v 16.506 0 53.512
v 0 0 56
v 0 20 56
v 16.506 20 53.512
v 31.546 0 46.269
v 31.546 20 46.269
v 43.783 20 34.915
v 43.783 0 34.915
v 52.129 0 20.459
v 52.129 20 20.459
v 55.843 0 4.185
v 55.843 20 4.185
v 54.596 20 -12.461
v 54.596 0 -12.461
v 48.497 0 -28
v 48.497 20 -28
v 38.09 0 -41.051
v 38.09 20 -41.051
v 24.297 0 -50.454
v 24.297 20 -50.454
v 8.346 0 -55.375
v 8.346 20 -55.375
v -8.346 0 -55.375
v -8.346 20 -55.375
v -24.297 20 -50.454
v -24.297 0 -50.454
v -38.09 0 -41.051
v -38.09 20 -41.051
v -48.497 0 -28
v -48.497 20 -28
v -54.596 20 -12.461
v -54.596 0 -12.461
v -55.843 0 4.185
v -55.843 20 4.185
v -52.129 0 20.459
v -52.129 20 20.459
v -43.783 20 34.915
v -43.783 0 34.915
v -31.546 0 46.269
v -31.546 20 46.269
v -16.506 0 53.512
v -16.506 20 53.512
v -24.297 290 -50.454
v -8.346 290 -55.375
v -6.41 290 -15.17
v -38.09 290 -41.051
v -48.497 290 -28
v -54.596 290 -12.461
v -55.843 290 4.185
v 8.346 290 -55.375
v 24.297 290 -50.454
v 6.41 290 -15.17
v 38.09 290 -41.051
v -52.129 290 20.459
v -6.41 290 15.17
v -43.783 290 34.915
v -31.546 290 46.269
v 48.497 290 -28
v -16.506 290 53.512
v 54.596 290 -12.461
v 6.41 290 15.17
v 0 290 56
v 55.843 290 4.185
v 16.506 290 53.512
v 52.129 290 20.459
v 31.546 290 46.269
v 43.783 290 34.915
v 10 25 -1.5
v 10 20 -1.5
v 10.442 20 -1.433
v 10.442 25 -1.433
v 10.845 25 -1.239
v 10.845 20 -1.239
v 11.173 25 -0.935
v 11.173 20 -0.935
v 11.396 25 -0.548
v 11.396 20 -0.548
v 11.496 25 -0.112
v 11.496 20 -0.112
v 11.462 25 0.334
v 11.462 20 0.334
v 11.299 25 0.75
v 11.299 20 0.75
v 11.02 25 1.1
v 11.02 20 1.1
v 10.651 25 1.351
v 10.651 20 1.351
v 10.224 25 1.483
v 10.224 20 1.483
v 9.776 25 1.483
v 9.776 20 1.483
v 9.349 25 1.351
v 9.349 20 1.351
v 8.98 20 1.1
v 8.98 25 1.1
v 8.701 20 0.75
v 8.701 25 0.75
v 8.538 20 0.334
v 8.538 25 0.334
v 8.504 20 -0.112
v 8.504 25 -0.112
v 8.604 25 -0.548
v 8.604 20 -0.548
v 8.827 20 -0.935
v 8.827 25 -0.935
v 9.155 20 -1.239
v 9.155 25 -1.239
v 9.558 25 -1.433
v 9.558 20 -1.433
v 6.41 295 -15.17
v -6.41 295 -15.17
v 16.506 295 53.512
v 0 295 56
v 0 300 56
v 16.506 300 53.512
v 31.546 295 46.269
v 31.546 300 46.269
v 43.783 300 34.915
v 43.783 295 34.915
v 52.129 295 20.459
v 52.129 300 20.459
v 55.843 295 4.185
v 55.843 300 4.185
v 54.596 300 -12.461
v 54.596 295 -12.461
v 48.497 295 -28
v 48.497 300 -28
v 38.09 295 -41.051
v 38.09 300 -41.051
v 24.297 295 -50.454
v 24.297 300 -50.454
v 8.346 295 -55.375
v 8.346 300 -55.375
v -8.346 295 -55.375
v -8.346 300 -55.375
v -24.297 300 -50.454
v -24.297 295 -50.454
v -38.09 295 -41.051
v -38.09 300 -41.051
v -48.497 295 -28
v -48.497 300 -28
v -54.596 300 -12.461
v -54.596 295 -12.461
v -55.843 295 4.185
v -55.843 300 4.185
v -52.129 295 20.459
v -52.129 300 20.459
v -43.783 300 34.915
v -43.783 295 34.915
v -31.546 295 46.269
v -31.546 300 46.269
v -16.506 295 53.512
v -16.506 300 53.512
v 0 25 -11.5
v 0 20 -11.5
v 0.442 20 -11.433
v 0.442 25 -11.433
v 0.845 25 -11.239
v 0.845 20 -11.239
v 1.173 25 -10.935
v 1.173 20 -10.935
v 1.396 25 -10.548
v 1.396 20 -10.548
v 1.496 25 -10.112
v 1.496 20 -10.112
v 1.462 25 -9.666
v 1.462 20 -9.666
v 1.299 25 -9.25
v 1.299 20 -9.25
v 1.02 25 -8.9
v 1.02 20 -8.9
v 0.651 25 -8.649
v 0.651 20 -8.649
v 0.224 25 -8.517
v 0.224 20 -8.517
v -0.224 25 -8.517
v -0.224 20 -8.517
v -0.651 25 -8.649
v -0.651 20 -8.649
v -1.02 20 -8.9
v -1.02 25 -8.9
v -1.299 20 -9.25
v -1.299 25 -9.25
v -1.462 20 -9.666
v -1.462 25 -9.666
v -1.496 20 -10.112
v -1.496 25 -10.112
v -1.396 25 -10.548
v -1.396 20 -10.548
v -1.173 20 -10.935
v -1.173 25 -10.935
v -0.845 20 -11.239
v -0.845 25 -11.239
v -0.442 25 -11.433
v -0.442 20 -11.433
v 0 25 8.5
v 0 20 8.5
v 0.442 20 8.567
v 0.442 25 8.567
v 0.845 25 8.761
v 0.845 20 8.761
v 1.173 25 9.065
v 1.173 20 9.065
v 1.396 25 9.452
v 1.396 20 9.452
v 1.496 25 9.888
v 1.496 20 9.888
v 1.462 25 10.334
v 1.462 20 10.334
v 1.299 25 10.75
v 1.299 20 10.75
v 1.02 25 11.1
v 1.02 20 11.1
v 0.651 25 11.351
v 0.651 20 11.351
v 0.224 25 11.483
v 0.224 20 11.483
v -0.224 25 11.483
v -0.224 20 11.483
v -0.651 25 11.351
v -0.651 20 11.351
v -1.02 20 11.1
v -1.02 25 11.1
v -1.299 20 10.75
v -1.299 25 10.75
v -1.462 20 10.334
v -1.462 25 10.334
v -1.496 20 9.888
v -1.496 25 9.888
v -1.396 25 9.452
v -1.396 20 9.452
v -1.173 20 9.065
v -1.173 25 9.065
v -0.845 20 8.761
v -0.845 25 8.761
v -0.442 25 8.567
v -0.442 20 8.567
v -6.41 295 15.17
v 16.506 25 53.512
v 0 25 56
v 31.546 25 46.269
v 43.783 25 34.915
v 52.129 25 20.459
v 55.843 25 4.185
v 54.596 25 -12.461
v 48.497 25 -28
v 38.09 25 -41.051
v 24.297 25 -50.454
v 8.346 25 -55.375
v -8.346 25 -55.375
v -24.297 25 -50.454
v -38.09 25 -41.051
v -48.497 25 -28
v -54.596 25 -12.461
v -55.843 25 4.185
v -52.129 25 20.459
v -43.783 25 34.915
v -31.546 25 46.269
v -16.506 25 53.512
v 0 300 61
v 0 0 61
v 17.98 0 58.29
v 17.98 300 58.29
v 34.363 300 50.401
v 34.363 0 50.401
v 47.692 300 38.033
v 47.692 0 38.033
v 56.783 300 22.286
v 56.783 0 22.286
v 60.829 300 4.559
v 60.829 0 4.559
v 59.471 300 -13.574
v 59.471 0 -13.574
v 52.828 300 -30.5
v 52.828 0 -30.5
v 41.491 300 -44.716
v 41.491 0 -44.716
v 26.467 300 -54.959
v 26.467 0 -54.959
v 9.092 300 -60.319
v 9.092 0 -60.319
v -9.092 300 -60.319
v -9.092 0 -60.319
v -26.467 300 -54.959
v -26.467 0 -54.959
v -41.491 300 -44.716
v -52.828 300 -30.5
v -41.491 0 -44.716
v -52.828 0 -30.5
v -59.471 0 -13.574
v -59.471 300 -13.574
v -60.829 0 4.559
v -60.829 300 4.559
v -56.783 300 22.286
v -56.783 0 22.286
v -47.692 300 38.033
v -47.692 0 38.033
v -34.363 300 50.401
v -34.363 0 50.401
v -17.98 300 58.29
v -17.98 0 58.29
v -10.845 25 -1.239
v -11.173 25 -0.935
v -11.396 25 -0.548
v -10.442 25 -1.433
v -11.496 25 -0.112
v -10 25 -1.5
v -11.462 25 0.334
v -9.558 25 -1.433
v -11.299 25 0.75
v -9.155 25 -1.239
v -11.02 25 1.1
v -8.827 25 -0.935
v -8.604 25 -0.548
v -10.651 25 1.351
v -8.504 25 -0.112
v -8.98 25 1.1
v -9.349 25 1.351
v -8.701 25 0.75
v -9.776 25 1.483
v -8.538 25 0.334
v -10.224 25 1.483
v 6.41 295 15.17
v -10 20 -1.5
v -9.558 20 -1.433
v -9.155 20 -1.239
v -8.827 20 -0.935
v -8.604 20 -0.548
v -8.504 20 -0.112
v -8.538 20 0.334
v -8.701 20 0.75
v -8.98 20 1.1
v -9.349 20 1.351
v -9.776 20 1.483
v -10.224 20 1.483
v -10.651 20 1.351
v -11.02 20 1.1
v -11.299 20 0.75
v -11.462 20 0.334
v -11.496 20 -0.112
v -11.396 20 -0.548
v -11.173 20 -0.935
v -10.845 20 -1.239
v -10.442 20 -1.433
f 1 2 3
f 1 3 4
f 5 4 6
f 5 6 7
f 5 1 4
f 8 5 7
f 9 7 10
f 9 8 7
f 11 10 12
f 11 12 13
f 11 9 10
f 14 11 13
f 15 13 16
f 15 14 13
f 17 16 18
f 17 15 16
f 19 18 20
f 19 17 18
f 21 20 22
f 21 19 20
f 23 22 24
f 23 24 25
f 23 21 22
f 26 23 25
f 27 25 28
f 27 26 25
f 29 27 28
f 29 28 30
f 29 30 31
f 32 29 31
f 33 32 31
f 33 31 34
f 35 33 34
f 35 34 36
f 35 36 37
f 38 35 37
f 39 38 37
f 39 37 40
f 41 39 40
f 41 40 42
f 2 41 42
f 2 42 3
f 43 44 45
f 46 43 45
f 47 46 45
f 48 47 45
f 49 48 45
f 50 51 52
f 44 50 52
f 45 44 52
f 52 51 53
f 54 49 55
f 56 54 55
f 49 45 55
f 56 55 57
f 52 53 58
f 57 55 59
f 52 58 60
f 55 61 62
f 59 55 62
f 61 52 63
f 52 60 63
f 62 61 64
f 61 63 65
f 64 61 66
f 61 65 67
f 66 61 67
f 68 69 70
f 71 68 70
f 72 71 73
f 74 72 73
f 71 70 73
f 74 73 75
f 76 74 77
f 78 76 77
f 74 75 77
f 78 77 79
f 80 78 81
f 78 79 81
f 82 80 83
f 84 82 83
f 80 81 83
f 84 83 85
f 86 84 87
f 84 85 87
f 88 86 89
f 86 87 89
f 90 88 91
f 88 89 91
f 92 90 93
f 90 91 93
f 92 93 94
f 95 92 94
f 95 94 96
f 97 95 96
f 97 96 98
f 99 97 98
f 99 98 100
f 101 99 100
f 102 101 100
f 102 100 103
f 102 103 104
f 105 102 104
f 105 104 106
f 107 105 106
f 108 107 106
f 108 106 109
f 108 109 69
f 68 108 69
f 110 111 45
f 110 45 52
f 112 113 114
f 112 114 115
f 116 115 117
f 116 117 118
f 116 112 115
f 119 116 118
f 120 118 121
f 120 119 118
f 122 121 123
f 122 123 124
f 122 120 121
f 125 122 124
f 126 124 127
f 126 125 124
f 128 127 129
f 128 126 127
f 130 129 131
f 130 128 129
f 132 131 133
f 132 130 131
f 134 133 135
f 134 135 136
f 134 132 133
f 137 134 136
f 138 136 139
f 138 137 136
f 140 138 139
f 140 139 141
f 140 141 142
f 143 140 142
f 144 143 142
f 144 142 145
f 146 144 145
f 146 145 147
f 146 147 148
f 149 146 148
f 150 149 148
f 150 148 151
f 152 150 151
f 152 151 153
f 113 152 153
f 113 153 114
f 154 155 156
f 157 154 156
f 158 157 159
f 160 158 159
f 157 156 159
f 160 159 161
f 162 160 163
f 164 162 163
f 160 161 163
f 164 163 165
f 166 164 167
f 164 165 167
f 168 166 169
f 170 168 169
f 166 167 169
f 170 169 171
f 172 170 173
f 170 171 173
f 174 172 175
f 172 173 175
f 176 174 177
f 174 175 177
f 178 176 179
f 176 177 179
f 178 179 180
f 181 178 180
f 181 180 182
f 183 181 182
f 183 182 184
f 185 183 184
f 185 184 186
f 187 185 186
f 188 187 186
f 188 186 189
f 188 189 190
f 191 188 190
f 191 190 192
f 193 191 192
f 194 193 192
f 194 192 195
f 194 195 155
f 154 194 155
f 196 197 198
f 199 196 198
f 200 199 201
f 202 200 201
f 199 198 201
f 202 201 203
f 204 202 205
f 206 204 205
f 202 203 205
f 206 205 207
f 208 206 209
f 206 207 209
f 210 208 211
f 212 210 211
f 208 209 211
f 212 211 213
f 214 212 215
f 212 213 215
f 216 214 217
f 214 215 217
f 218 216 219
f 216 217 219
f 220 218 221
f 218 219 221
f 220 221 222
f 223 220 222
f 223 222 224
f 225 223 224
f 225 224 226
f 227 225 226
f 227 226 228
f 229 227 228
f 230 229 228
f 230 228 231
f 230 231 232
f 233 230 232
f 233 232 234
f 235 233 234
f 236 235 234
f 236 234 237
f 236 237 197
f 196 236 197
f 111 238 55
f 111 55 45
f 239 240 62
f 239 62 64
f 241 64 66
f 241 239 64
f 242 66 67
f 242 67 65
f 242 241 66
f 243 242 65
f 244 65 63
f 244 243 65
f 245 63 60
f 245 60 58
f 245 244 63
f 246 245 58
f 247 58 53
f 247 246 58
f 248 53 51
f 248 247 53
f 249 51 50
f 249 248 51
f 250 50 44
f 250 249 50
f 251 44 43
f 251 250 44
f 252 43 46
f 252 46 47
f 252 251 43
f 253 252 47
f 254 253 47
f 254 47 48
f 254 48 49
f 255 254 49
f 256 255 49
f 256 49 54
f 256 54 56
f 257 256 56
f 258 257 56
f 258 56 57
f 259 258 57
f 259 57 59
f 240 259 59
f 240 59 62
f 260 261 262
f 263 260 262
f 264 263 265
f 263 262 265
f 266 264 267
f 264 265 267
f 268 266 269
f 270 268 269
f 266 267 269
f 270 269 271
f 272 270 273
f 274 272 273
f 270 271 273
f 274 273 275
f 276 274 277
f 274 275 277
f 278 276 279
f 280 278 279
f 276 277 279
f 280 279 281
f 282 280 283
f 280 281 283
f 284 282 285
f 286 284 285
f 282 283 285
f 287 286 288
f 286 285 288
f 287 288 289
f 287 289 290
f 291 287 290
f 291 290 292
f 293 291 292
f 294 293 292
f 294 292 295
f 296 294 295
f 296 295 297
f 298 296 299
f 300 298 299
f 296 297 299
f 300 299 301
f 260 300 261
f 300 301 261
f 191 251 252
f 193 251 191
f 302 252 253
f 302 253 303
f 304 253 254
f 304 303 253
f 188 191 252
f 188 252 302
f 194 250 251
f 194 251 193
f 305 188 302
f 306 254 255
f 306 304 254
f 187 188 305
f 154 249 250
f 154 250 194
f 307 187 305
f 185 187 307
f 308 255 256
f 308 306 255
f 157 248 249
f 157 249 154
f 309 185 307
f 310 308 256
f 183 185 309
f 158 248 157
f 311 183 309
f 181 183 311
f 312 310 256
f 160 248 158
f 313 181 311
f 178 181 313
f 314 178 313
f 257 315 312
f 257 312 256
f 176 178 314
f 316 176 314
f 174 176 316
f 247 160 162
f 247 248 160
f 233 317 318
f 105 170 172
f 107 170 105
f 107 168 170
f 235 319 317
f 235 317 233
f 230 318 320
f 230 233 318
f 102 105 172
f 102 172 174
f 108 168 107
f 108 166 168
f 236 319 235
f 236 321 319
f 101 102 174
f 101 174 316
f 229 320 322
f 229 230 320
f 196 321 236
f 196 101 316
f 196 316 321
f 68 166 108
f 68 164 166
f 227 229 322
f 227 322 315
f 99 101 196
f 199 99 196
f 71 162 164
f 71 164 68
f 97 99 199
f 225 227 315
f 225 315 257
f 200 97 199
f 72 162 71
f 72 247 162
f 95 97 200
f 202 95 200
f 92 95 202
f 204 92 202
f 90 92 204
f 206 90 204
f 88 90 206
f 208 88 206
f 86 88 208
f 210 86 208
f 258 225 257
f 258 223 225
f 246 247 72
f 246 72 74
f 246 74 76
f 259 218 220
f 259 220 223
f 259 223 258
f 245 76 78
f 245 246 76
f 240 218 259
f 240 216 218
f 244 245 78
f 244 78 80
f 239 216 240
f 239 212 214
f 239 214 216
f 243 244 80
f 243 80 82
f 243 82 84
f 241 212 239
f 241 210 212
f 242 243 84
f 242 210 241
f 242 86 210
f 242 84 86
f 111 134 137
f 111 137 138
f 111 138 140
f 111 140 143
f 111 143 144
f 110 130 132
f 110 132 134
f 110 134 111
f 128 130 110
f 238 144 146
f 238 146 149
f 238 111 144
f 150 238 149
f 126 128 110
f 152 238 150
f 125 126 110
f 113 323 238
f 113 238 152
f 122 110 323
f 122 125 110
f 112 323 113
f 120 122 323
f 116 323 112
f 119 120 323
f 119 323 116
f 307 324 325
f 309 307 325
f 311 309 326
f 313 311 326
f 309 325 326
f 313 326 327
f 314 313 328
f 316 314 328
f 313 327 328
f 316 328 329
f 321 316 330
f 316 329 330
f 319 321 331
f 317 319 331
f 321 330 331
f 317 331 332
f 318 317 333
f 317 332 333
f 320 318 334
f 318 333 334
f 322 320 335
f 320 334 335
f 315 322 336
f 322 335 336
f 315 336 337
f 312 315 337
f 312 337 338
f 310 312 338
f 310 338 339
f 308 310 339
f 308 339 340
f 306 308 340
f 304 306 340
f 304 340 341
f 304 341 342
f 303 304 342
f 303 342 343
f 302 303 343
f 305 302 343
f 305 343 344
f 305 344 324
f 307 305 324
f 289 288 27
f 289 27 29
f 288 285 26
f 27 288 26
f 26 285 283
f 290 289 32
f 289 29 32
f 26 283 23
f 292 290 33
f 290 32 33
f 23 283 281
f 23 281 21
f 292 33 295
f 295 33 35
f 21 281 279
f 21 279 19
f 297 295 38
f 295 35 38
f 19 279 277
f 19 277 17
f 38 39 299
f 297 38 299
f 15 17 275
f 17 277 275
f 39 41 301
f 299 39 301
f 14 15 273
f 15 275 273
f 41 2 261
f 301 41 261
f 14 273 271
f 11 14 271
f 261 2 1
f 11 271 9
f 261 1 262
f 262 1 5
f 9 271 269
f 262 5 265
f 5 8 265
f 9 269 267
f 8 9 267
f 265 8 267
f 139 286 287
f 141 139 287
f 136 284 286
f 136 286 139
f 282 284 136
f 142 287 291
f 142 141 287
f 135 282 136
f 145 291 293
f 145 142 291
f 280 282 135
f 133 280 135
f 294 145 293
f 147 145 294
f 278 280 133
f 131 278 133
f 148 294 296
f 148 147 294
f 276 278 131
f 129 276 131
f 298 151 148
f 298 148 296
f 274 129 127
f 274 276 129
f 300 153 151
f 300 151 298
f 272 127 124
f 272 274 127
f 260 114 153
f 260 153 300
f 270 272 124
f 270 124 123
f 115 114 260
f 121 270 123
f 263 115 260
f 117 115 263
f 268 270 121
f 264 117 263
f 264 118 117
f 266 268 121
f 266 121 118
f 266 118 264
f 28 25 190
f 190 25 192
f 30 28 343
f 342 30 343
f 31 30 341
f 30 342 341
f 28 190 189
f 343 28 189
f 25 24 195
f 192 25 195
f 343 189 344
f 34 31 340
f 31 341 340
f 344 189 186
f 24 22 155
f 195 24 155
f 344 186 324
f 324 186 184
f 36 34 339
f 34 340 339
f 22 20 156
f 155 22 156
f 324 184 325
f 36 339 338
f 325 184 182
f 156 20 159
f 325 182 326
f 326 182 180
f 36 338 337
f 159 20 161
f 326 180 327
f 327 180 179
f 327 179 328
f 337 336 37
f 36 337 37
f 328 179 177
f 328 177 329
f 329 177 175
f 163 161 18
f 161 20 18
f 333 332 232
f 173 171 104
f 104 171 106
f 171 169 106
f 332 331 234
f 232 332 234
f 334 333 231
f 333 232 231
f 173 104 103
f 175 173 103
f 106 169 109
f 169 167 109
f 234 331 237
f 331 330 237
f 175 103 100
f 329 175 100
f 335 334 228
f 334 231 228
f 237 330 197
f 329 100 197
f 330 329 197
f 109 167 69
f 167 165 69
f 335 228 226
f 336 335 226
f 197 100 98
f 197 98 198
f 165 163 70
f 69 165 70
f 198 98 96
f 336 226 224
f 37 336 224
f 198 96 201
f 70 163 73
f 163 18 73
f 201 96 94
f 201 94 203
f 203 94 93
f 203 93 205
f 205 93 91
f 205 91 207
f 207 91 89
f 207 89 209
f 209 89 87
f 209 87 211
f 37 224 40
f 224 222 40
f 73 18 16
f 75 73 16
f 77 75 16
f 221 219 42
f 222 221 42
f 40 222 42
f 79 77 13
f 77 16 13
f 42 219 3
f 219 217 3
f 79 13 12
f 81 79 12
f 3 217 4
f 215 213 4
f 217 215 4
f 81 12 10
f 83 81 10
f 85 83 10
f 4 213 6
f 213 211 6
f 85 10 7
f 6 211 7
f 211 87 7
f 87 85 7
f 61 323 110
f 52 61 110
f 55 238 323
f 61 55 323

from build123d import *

# Parameters (mm, degrees)
SKETCH1_R           = 61
SKETCH1_R_2         = 56
BOSS_EXTRUDE1_DEPTH = 300
SKETCH3_R           = 56
BOSS_EXTRUDE2_DEPTH = 5
CUT_EXTRUDE1_REACH  = 294.988
SKETCH4_R           = 1.5
SKETCH5_R           = 56
BOSS_EXTRUDE3_DEPTH = 5
CUT_EXTRUDE2_REACH  = 309.355
SKETCH6_W           = 12.82
SKETCH6_H           = 30.34


with BuildPart() as part:
    # Sketch1 → Boss-Extrude1 (new body)
    with BuildSketch(Plane(origin=(0, 0, 0), x_dir=(1, 0, 0), z_dir=(0, 1, 0))):
        with Locations(Location((0, 0, 0), (0, 0, 270))):
            Circle(SKETCH1_R)
        with Locations(Location((0, 0, 0), (0, 0, 270))):
            Circle(SKETCH1_R_2, mode=Mode.SUBTRACT)
    extrude(amount=BOSS_EXTRUDE1_DEPTH)

    # Sketch3 → Boss-Extrude2 (add)
    with BuildSketch(Plane(origin=(0, 20, 0), x_dir=(1, 0, 0), z_dir=(0, 1, 0))):
        with Locations(Location((0, 0, 0), (0, 0, 270))):
            Circle(SKETCH3_R)
    extrude(amount=BOSS_EXTRUDE2_DEPTH)

    # Sketch4 → Cut-Extrude1 (cut, up to next)
    with BuildSketch(Plane.XZ.offset(-20), mode=Mode.PRIVATE) as cut_extrude1_sk1:
        with Locations(Location((10, 0, 0), (0, 0, 270))):
            Circle(SKETCH4_R)
    cut_extrude1_tool1 = extrude(cut_extrude1_sk1.sketch, amount=-CUT_EXTRUDE1_REACH, mode=Mode.PRIVATE) & part.part
    # Sketch4 → Cut-Extrude1 (cut, up to next)
    with BuildSketch(Plane.XZ.offset(-20), mode=Mode.PRIVATE) as cut_extrude1_sk2:
        with Locations(Location((0, 10, 0), (0, 0, 270))):
            Circle(SKETCH4_R)
    cut_extrude1_tool2 = extrude(cut_extrude1_sk2.sketch, amount=-CUT_EXTRUDE1_REACH, mode=Mode.PRIVATE) & part.part
    # Sketch4 → Cut-Extrude1 (cut, up to next)
    with BuildSketch(Plane.XZ.offset(-20), mode=Mode.PRIVATE) as cut_extrude1_sk3:
        with Locations(Location((-10, 0, 0), (0, 0, 270))):
            Circle(SKETCH4_R)
    cut_extrude1_tool3 = extrude(cut_extrude1_sk3.sketch, amount=-CUT_EXTRUDE1_REACH, mode=Mode.PRIVATE) & part.part
    # Sketch4 → Cut-Extrude1 (cut, up to next)
    with BuildSketch(Plane.XZ.offset(-20), mode=Mode.PRIVATE) as cut_extrude1_sk4:
        with Locations(Location((0, -10, 0), (0, 0, 270))):
            Circle(SKETCH4_R)
    cut_extrude1_tool4 = extrude(cut_extrude1_sk4.sketch, amount=-CUT_EXTRUDE1_REACH, mode=Mode.PRIVATE) & part.part
    add(cut_extrude1_tool1.solids().sort_by_distance((10, 20, 0))[0], mode=Mode.SUBTRACT)
    add(cut_extrude1_tool2.solids().sort_by_distance((0, 20, 10))[0], mode=Mode.SUBTRACT)
    add(cut_extrude1_tool3.solids().sort_by_distance((-10, 20, 0))[0], mode=Mode.SUBTRACT)
    add(cut_extrude1_tool4.solids().sort_by_distance((0, 20, -10))[0], mode=Mode.SUBTRACT)

    # Sketch5 → Boss-Extrude3 (add)
    with BuildSketch(Plane(origin=(0, 290, 0), x_dir=(1, 0, 0), z_dir=(0, 1, 0))):
        with Locations(Location((0, 0, 0), (0, 0, 270))):
            Circle(SKETCH5_R)
    extrude(amount=BOSS_EXTRUDE3_DEPTH)

    # Sketch6 → Cut-Extrude2 (cut, up to next)
    with BuildSketch(Plane(origin=(0, 295, 0), x_dir=(1, 0, 0), z_dir=(0, 1, 0)), mode=Mode.PRIVATE) as cut_extrude2_sk1:
        Rectangle(SKETCH6_W, SKETCH6_H)
    cut_extrude2_tool1 = extrude(cut_extrude2_sk1.sketch, amount=-CUT_EXTRUDE2_REACH, mode=Mode.PRIVATE) & part.part
    add(cut_extrude2_tool1.solids().sort_by_distance((0, 295, 0))[0], mode=Mode.SUBTRACT)


solid = part.part
